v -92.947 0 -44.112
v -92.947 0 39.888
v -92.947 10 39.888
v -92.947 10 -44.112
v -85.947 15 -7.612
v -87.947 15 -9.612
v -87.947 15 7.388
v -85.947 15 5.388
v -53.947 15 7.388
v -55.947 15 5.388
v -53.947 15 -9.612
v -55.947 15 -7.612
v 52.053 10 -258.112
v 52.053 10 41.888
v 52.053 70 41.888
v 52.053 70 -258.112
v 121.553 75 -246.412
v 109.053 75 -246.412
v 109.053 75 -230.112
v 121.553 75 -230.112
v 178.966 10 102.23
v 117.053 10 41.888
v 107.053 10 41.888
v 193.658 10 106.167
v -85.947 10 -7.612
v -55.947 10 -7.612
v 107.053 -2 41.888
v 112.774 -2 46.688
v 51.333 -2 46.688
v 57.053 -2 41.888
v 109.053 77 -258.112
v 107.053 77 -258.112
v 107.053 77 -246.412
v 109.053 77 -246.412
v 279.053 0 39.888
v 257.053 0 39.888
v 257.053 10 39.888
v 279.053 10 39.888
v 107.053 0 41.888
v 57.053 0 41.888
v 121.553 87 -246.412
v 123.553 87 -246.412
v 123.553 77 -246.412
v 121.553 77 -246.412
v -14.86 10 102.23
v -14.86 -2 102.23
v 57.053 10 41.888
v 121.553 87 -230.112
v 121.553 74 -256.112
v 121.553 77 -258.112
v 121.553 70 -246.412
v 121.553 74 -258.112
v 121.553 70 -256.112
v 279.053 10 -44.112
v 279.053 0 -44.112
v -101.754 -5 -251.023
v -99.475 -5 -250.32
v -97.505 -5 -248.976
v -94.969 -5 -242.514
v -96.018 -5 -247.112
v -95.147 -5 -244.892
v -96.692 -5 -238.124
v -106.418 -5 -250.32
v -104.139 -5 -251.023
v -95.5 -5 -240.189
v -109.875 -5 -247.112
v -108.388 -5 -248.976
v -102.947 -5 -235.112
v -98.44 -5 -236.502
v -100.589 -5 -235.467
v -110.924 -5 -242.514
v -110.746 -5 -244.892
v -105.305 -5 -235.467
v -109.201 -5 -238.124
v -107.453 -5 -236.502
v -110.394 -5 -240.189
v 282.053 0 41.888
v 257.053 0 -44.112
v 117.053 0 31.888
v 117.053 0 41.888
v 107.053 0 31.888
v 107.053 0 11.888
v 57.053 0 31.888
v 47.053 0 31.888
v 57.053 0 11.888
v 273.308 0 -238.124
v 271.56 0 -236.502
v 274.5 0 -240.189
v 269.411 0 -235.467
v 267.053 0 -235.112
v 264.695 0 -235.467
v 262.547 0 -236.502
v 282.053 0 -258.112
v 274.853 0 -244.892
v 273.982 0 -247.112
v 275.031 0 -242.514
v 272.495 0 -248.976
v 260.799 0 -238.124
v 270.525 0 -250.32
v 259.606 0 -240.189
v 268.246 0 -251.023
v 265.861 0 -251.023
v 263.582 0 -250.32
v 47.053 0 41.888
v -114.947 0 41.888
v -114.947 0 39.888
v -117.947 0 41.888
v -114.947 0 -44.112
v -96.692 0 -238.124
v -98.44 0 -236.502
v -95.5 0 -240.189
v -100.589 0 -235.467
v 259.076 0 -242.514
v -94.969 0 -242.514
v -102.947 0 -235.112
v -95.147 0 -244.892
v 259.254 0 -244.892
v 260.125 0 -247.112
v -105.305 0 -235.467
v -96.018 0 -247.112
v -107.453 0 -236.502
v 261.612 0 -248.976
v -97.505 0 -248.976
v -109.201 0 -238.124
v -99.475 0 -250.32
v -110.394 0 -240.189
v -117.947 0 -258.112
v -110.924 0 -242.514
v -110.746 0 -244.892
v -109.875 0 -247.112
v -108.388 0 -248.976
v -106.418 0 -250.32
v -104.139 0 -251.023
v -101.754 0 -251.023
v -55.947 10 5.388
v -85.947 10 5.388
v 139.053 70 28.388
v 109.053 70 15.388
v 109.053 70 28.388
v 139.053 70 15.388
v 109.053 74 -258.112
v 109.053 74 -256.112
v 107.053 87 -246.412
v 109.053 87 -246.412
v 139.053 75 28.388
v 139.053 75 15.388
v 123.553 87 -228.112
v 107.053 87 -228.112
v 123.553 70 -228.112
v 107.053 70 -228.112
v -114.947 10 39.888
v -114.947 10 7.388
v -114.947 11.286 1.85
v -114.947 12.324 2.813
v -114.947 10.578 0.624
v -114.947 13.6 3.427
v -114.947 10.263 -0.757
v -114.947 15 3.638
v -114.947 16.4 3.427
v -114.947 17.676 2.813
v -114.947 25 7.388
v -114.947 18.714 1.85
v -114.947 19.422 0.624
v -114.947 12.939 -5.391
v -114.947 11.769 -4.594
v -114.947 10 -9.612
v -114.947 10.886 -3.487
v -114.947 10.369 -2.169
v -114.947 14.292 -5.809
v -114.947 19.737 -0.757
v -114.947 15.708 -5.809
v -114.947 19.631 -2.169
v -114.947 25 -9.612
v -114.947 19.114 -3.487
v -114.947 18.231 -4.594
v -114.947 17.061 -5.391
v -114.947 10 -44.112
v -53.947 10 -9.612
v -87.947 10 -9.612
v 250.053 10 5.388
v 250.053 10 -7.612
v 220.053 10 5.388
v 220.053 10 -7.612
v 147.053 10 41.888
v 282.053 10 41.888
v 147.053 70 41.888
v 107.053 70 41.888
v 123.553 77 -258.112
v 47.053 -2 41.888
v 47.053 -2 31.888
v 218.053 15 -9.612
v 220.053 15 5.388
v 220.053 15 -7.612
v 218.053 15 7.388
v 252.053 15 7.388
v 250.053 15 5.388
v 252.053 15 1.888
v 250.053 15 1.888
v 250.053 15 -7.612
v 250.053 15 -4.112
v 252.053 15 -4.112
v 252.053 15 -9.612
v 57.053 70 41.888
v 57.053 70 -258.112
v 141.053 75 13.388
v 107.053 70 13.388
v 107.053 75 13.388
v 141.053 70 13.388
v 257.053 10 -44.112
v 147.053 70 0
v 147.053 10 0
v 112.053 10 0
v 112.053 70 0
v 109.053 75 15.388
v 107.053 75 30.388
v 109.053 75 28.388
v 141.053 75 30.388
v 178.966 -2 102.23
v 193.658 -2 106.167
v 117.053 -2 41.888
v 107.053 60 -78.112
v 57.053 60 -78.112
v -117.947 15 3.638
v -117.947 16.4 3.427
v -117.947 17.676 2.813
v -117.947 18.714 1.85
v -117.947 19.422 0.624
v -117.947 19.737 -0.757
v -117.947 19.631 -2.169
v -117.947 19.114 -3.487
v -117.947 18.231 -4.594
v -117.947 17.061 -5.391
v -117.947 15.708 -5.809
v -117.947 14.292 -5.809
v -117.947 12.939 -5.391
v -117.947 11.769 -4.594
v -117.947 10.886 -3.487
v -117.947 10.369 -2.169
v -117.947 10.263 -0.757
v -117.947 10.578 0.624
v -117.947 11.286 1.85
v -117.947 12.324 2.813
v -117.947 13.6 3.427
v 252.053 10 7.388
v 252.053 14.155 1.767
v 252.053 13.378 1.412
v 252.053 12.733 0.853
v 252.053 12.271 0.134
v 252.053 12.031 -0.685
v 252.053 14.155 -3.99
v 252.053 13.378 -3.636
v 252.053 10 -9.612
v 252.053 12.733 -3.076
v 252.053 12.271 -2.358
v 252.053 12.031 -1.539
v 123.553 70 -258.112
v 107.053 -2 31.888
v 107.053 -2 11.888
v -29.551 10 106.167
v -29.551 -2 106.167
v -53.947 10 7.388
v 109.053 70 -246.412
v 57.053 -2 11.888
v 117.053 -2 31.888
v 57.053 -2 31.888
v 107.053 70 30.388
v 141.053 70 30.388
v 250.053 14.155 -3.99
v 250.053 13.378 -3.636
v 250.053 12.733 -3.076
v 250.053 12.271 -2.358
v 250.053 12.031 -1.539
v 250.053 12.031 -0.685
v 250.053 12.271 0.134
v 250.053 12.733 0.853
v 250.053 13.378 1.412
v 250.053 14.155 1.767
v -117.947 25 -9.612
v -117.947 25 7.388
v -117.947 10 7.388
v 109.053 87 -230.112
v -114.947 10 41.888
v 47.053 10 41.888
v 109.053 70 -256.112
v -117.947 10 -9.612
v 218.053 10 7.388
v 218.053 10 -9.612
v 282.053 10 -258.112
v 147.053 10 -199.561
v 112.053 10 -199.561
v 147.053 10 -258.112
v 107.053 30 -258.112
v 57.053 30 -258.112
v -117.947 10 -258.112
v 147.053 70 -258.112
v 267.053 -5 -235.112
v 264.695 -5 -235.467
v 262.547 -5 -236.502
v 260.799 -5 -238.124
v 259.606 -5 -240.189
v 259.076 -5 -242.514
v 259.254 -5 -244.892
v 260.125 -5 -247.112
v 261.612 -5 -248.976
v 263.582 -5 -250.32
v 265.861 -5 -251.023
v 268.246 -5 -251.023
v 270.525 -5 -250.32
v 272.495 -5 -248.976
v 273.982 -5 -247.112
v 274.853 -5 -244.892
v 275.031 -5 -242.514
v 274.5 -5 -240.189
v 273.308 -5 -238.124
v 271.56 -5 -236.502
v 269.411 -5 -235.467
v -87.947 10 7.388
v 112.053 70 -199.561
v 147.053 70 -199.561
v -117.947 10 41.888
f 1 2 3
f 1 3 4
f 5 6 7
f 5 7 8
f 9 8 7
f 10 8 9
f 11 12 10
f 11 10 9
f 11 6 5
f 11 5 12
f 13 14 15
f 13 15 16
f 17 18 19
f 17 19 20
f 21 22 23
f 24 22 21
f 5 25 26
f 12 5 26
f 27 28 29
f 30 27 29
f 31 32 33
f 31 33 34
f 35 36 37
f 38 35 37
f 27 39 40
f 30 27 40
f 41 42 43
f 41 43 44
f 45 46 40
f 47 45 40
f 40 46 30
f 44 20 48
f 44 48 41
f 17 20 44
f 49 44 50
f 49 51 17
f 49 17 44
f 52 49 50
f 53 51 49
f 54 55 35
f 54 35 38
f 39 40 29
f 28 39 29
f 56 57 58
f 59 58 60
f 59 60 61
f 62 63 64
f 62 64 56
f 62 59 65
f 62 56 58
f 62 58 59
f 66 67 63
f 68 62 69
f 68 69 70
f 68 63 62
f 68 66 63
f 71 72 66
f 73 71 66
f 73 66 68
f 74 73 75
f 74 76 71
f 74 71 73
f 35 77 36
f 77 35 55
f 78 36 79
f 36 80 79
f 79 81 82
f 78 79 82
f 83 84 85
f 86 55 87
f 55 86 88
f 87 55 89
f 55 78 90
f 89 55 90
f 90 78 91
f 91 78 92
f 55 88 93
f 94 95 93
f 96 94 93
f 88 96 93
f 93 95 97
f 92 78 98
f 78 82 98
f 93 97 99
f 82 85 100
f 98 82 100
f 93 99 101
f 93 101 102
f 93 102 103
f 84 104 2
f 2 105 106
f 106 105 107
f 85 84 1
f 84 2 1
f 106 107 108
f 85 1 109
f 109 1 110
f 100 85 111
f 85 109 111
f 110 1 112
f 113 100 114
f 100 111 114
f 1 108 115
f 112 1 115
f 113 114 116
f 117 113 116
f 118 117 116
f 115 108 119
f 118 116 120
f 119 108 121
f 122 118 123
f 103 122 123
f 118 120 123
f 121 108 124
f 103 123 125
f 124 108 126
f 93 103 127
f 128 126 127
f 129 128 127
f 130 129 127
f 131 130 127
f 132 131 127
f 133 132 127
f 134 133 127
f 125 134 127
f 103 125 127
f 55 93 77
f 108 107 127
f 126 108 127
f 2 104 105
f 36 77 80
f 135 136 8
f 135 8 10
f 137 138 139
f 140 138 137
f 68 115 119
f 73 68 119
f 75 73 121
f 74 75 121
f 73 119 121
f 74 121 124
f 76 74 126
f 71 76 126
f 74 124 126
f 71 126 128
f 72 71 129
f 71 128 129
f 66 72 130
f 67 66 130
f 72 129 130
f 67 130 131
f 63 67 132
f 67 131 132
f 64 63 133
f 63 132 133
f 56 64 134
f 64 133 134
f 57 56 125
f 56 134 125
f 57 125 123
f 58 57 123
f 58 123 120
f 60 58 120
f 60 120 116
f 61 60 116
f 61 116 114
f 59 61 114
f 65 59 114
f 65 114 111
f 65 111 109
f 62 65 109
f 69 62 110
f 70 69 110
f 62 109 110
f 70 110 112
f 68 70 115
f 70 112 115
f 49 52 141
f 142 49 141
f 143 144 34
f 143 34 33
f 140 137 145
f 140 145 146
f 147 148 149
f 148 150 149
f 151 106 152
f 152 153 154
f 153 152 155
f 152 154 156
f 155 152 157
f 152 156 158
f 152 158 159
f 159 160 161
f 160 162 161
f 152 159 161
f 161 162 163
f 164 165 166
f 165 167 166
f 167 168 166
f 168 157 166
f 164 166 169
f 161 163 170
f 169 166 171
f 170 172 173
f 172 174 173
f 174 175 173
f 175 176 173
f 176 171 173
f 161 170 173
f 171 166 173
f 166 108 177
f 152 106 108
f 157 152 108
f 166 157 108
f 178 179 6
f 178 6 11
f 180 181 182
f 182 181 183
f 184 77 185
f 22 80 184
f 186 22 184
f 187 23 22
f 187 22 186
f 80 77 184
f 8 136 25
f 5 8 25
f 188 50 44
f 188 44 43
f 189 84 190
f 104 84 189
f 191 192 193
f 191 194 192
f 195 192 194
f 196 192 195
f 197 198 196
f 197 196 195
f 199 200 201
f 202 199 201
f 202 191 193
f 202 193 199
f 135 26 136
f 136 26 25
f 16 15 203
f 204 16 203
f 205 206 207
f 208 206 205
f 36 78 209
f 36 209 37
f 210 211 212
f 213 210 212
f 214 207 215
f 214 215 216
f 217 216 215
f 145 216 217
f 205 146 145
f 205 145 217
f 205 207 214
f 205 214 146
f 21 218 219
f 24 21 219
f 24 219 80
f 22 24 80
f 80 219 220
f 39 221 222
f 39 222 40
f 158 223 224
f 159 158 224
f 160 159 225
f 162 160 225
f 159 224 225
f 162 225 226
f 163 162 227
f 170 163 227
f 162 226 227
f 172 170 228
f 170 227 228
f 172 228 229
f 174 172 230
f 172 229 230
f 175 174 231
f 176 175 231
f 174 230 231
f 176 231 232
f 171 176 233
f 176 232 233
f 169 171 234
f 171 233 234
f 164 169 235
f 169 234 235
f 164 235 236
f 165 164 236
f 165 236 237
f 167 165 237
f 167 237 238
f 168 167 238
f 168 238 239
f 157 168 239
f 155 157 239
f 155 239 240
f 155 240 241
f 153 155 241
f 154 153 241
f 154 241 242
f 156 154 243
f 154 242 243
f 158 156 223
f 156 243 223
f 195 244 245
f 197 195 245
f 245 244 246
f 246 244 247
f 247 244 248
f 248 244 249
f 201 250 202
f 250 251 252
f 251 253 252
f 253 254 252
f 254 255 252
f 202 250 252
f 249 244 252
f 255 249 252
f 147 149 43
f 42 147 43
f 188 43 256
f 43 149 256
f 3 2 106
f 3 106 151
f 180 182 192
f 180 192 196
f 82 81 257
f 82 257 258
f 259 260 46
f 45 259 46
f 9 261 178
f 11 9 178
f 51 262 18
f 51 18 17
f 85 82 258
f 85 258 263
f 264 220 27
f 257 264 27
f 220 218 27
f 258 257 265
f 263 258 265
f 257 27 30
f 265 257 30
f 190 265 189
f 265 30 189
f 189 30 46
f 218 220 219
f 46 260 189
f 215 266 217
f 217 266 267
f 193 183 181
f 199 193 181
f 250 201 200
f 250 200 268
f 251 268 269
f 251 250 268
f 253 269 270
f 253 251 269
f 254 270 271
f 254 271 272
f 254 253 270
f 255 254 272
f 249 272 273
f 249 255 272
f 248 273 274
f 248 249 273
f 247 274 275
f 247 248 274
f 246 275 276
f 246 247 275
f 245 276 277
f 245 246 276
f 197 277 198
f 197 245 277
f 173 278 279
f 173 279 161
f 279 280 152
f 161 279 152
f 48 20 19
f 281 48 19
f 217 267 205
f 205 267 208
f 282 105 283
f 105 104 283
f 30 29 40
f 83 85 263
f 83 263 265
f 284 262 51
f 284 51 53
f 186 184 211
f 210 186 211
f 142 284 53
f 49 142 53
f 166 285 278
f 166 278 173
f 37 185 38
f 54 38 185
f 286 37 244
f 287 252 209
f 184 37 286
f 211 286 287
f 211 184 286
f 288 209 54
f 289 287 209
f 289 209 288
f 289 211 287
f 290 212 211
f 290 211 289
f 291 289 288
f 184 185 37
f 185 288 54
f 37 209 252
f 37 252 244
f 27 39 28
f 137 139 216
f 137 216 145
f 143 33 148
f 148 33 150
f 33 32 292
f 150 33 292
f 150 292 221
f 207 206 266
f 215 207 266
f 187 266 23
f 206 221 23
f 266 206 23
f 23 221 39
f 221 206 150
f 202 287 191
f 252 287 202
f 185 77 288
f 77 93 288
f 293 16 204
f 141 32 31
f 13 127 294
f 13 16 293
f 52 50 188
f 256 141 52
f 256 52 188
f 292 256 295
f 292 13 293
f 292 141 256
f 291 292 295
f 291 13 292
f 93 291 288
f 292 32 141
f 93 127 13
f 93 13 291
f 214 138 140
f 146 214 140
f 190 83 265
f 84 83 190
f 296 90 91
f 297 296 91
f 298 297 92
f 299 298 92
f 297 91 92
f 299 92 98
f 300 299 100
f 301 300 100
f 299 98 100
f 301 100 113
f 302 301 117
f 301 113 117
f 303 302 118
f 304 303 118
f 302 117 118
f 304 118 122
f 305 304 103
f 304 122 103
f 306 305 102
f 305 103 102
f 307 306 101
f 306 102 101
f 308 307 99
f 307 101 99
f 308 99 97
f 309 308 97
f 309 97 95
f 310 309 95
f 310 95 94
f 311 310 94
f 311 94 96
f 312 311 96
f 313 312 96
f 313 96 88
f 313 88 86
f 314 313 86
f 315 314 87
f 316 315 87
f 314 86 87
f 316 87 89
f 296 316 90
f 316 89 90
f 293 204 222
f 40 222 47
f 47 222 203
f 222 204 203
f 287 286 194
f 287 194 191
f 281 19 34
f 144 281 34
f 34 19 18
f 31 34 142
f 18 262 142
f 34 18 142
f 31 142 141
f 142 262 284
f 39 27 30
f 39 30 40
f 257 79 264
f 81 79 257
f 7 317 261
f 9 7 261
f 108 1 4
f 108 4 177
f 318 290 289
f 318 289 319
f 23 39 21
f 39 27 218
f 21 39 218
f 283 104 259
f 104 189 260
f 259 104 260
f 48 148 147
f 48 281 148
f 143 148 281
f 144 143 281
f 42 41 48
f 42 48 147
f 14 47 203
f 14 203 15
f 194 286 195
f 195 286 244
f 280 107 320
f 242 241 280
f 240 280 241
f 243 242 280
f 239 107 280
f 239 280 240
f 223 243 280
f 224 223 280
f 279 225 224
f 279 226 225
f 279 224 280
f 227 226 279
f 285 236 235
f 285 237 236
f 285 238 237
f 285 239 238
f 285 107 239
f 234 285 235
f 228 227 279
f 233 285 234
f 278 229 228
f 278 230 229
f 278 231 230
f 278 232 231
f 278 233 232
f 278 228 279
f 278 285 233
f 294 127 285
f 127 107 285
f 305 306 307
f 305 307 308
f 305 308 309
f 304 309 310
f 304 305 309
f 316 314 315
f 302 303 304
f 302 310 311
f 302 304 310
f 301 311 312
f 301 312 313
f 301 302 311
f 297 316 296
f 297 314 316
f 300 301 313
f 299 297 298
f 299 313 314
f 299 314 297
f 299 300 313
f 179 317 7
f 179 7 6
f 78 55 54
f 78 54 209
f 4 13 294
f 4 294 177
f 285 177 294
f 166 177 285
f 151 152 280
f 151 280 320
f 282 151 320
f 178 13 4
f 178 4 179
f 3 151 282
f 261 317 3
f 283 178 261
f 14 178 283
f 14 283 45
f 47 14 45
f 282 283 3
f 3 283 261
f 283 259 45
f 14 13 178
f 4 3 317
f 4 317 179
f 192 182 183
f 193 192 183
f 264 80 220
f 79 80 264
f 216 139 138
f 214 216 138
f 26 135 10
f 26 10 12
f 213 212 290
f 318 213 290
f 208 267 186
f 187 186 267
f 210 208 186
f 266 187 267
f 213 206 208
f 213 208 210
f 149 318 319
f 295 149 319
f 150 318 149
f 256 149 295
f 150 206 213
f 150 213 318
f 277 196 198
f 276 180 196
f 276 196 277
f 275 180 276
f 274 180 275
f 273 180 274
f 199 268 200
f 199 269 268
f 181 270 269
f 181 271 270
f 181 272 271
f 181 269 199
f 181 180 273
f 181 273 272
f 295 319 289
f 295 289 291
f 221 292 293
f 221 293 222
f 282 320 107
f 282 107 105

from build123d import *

# Parameters (mm, degrees)
BOSS_EXTRUDE3_DEPTH              = 10
SKETCH2_W                        = 34
SKETCH2_H                        = 17
SKETCH2_W_2                      = 30
SKETCH2_H_2                      = 13
BOSS_EXTRUDE4_DEPTH              = 5
SKETCH3_W                        = 50
SKETCH3_H                        = 120
BOSS_EXTRUDE5_DEPTH              = 50
CUT_EXTRUDE2_DEPTH               = 50
SKETCH5_W                        = 50
SKETCH5_H                        = 180
BOSS_EXTRUDE6_DEPTH              = 50
CUT_EXTRUDE3_DEPTH               = 348.630164486
SKETCH7_W                        = 5
SKETCH7_H                        = 300
BOSS_EXTRUDE7_DEPTH              = 70
SKETCH9_W                        = 34
SKETCH9_H                        = 17
SKETCH9_W_2                      = 30
SKETCH9_H_2                      = 13
BOSS_EXTRUDE8_DEPTH              = 5
SKETCH10_W                       = 58.550377391
SKETCH10_H                       = 60
BOSS_EXTRUDE9_DEPTH              = 35
SKETCH13_W                       = 16.5
SKETCH13_H                       = 30
SKETCH13_W_2                     = 12.5
SKETCH13_H_2                     = 26
BOSS_EXTRUDE11_DEPTH             = 7
BOSS_EXTRUDE16_DEPTH             = 10
BOSS_EXTRUDE16_DEPTH_BACK        = 2
BOSS_EXTRUDE19_DEPTH             = 2
BOSS_EXTRUDE23_REACH             = 352.964
BOSS_EXTRUDE23_DIRECTION_2_REACH = 352.964
SKETCH28_W                       = 3
SKETCH28_H                       = 10
BOSS_EXTRUDE24_DEPTH             = 85.999998
SKETCH30_W                       = 3
SKETCH30_H                       = 10
BOSS_EXTRUDE26_DEPTH             = 86
SKETCH32_W                       = 12.5
SKETCH32_H                       = 16.3
BOSS_EXTRUDE28_DEPTH             = 5
BOSS_EXTRUDE31_DEPTH             = 10
SKETCH35_W                       = 12.5
SKETCH35_H                       = 3
CUT_EXTRUDE4_DEPTH               = 2
CUT_EXTRUDE14_DEPTH              = 2
SKETCH41_W                       = 3
SKETCH41_H                       = 17
BOSS_EXTRUDE33_DEPTH             = 15
SKETCH42_R                       = 4.75
CUT_EXTRUDE11_DEPTH              = 3
SKETCH14_R                       = 8
BOSS_EXTRUDE34_DEPTH             = 5
SKETCH16_R                       = 8
BOSS_EXTRUDE35_DEPTH             = 5
SKETCH43_W                       = 2
SKETCH43_H                       = 10
BOSS_EXTRUDE36_DEPTH             = 22
BOSS_EXTRUDE37_REACH             = 465.482
SKETCH44_W                       = 2
SKETCH44_H                       = 10


with BuildPart() as part:
    # Sketch1 → Boss-Extrude3 (new body)
    with BuildSketch(Plane(origin=(0, 0, 0), x_dir=(1, 0, 0), z_dir=(0, 1, 0))):
        Polygon((-117.946551632, 258.11185804), (282.053448368, 258.11185804), (282.053448368, 44.11185804), (257.053448368, 44.11185804), (257.053448368, -41.88814196), (-92.946551632, -41.88814196), (-92.946551632, 44.11185804), (-117.946551632, 44.11185804), align=None)
    extrude(amount=BOSS_EXTRUDE3_DEPTH)

    # Sketch2 → Boss-Extrude4 (add)
    # profile 1 of 2: a face of its own
    with BuildSketch(Plane(origin=(0, 10, 0), x_dir=(1, 0, 0), z_dir=(0, 1, 0))):
        with Locations((-70.946551632, 1.11185804)):
            Rectangle(SKETCH2_W, SKETCH2_H)
        with Locations((-70.946551632, 1.11185804)):
            Rectangle(SKETCH2_W_2, SKETCH2_H_2, mode=Mode.SUBTRACT)
    # profile 2 of 2: a face of its own
    with BuildSketch(Plane(origin=(0, 10, 0), x_dir=(1, 0, 0), z_dir=(0, 1, 0))):
        with Locations((235.053448368, 1.11185804)):
            Rectangle(SKETCH2_W, SKETCH2_H)
        with Locations((235.053448368, 1.11185804)):
            Rectangle(SKETCH2_W_2, SKETCH2_H_2, mode=Mode.SUBTRACT)
    extrude(amount=BOSS_EXTRUDE4_DEPTH)

    # Sketch3 → Boss-Extrude5 (add)
    with BuildSketch(Plane(origin=(0, 10, 0), x_dir=(1, 0, 0), z_dir=(0, 1, 0))):
        with Locations((82.053448368, 18.11185804)):
            Rectangle(SKETCH3_W, SKETCH3_H)
    extrude(amount=BOSS_EXTRUDE5_DEPTH)

    # Sketch4 → Cut-Extrude2 (cut)
    with BuildSketch(Plane(origin=(107.053448368, 0, 0), x_dir=(0, 0, -1), z_dir=(1, 0, 0))):
        Polygon((-41.88814196, 60), (78.11185804, 60), (-41.88814196, 0), align=None)
    extrude(amount=-CUT_EXTRUDE2_DEPTH, mode=Mode.SUBTRACT)

    # Sketch5 → Boss-Extrude6 (add)
    with BuildSketch(Plane(origin=(0, 10, 0), x_dir=(1, 0, 0), z_dir=(0, 1, 0))):
        with Locations((82.053448368, 168.11185804)):
            Rectangle(SKETCH5_W, SKETCH5_H)
    extrude(amount=BOSS_EXTRUDE6_DEPTH)

    # Sketch6 → Cut-Extrude3 (cut, through all)
    with BuildSketch(Plane(origin=(107.053448368, 0, 0), x_dir=(0, 0, -1), z_dir=(1, 0, 0))):
        Polygon((78.11185804, 60), (258.11185804, 60), (258.11185804, 30), align=None)
    extrude(amount=-CUT_EXTRUDE3_DEPTH, mode=Mode.SUBTRACT)

    # Sketch7 → Boss-Extrude7 (add)
    with BuildSketch(Plane(origin=(0, 0, 0), x_dir=(1, 0, 0), z_dir=(0, 1, 0))):
        with Locations((54.553448368, 108.11185804)):
            Rectangle(SKETCH7_W, SKETCH7_H)
        Polygon((112.053448368, 258.11185804), (107.053448368, 258.11185804), (107.053448368, -41.88814196), (147.053448368, -41.88814196), (147.053448368, 0), (112.053448368, 0), align=None)
    extrude(amount=BOSS_EXTRUDE7_DEPTH)

    # Sketch9 → Boss-Extrude8 (add)
    with BuildSketch(Plane(origin=(0, 70, 0), x_dir=(1, 0, 0), z_dir=(0, 1, 0))):
        with Locations((124.053448368, -21.88814196)):
            Rectangle(SKETCH9_W, SKETCH9_H)
        with Locations((124.053448368, -21.88814196)):
            Rectangle(SKETCH9_W_2, SKETCH9_H_2, mode=Mode.SUBTRACT)
    extrude(amount=BOSS_EXTRUDE8_DEPTH)

    # Sketch10 → Boss-Extrude9 (add)
    with BuildSketch(Plane(origin=(112.053448368, 0, 0), x_dir=(0, 0, -1), z_dir=(1, 0, 0))):
        with Locations((228.836669345, 40)):
            Rectangle(SKETCH10_W, SKETCH10_H)
    extrude(amount=BOSS_EXTRUDE9_DEPTH)

    # Sketch13 → Boss-Extrude11 (add)
    with BuildSketch(Plane(origin=(0, 70, 0), x_dir=(1, 0, 0), z_dir=(0, 1, 0))):
        with Locations((115.303448368, 243.11185804)):
            Rectangle(SKETCH13_W, SKETCH13_H)
        with Locations((115.303448368, 243.11185804)):
            Rectangle(SKETCH13_W_2, SKETCH13_H_2, mode=Mode.SUBTRACT)
    extrude(amount=BOSS_EXTRUDE11_DEPTH)

    # Sketch20 → Boss-Extrude16 (add, two sides: drawn at the far end of the back side and taken through both)
    with BuildSketch(Plane(origin=(0, 0, 0), x_dir=(1, 0, 0), z_dir=(0, 1, 0)).offset(-BOSS_EXTRUDE16_DEPTH_BACK)):
        Polygon((47.053448368, -41.88814196), (-29.550995944, -106.166902929), (-14.859601624, -102.230355685), (57.053448368, -41.88814196), align=None)
        Polygon((107.053448368, -41.88814196), (178.96649836, -102.230355685), (193.65789268, -106.166902929), (117.053448368, -41.88814196), align=None)
    extrude(amount=BOSS_EXTRUDE16_DEPTH + BOSS_EXTRUDE16_DEPTH_BACK)

    # Sketch21 → Boss-Extrude19 (add)
    with BuildSketch(Plane.XZ):
        Polygon((57.053448368, 41.88814196), (107.053448368, 41.88814196), (117.053448368, 41.88814196), (117.053448368, 31.88814196), (107.053448368, 31.88814196), (107.053448368, 11.88814196), (57.053448368, 11.88814196), (57.053448368, 31.88814196), (47.053448368, 31.88814196), (47.053448368, 41.88814196), align=None)
    extrude(amount=BOSS_EXTRUDE19_DEPTH)


with BuildPart() as body_2:

    # Boss-Extrude23: up to this face of the body (flat: up to its plane)
    boss_extrude23_end = Plane(part.part.faces().sort_by_distance((21.096923372, 4, 72.059248823))[0])
    # Sketch23 → Boss-Extrude23 (new, up to the picked face)
    with BuildSketch(Plane(origin=(107.053448368, 0, 0), x_dir=(0, 0, -1), z_dir=(1, 0, 0)), mode=Mode.PRIVATE) as boss_extrude23_sk1:
        Polygon((-41.88814196, 0), (-46.68814196, -2), (-41.88814196, -2), align=None)
    boss_extrude23_tool1 = split(extrude(boss_extrude23_sk1.sketch, amount=-BOSS_EXTRUDE23_REACH, mode=Mode.PRIVATE), bisect_by=boss_extrude23_end, keep=Keep.BOTH, mode=Mode.PRIVATE)
    add(boss_extrude23_tool1.solids().sort_by(Axis((107.053448, -1.333333, 43.488142), (-1, 0, 0)))[0])


    # Boss-Extrude23 direction 2: up to this face of the body (flat: up to its plane)
    boss_extrude23_direction_2_end = Plane(part.part.faces().sort_by_distance((143.009973364, 4, 72.059248823))[0])
    # Sketch23 → Boss-Extrude23 direction 2 (add, up to the picked face)
    with BuildSketch(Plane(origin=(107.053448368, 0, 0), x_dir=(0, 0, -1), z_dir=(1, 0, 0)), mode=Mode.PRIVATE) as boss_extrude23_direction_2_sk1:
        Polygon((-41.88814196, 0), (-46.68814196, -2), (-41.88814196, -2), align=None)
    boss_extrude23_direction_2_tool1 = split(extrude(boss_extrude23_direction_2_sk1.sketch, amount=BOSS_EXTRUDE23_DIRECTION_2_REACH, mode=Mode.PRIVATE), bisect_by=boss_extrude23_direction_2_end, keep=Keep.BOTH, mode=Mode.PRIVATE)
    add(boss_extrude23_direction_2_tool1.solids().sort_by(Axis((107.053448, -1.333333, 43.488142), (1, 0, 0)))[0])


with BuildPart() as part_1:
    add(part.part)

    # Sketch28 → Boss-Extrude24 (add)
    with BuildSketch(Plane.XY.offset(-44.11185804)):
        with Locations((-116.446551632, 5)):
            Rectangle(SKETCH28_W, SKETCH28_H)
    extrude(amount=BOSS_EXTRUDE24_DEPTH)

    # Sketch30 → Boss-Extrude26 (add)
    with BuildSketch(Plane.XY.offset(-44.11185804)):
        with Locations((280.553448368, 5)):
            Rectangle(SKETCH30_W, SKETCH30_H)
    extrude(amount=BOSS_EXTRUDE26_DEPTH)

    # Sketch32 → Boss-Extrude28 (add)
    with BuildSketch(Plane(origin=(0, 70, 0), x_dir=(1, 0, 0), z_dir=(0, 1, 0))):
        with Locations((115.303448368, 238.26185804)):
            Rectangle(SKETCH32_W, SKETCH32_H)
    extrude(amount=BOSS_EXTRUDE28_DEPTH)

    # Sketch34 → Boss-Extrude31 (add)
    with BuildSketch(Plane(origin=(0, 77, 0), x_dir=(1, 0, 0), z_dir=(0, 1, 0))):
        Polygon((109.053448368, 246.41185804), (107.053448368, 246.41185804), (107.053448368, 228.11185804), (123.553448368, 228.11185804), (123.553448368, 246.41185804), (121.553448368, 246.41185804), (121.553448368, 230.11185804), (109.053448368, 230.11185804), align=None)
    extrude(amount=BOSS_EXTRUDE31_DEPTH)

    # Sketch35 → Cut-Extrude4 (cut)
    with BuildSketch(Plane(origin=(0, 0, -258.11185804), x_dir=(-1, 0, 0), z_dir=(0, 0, -1))):
        with Locations((-115.303448368, 75.5)):
            Rectangle(SKETCH35_W, SKETCH35_H)
    extrude(amount=-CUT_EXTRUDE4_DEPTH, mode=Mode.SUBTRACT)

    # Sketch47 → Cut-Extrude14 (cut)
    with BuildSketch(Plane(origin=(252.053448368, 0, 0), x_dir=(0, 0, -1), z_dir=(1, 0, 0))):
        with BuildLine():
            Line((-1.88814196, 15), (4.11185804, 15))
            ThreePointArc((4.11185804, 15), (1.11185804, 12), (-1.88814196, 15))
        make_face()
    extrude(amount=-CUT_EXTRUDE14_DEPTH, mode=Mode.SUBTRACT)

    # Sketch41 → Boss-Extrude33 (add)
    with BuildSketch(Plane(origin=(0, 10, 0), x_dir=(1, 0, 0), z_dir=(0, 1, 0))):
        with Locations((-116.446551632, 1.11185804)):
            Rectangle(SKETCH41_W, SKETCH41_H)
    extrude(amount=BOSS_EXTRUDE33_DEPTH)

    # Sketch42 → Cut-Extrude11 (cut)
    with BuildSketch(Plane.ZY.offset(117.946551632)):
        with Locations((-1.11185804, 15)):
            Circle(SKETCH42_R)
    extrude(amount=-CUT_EXTRUDE11_DEPTH, mode=Mode.SUBTRACT)

    # Sketch14 → Boss-Extrude34 (add)
    with BuildSketch(Plane.XZ):
        with Locations(Location((267.053448368, -243.11185804, 0), (0, 0, 90))):
            Circle(SKETCH14_R)
    extrude(amount=BOSS_EXTRUDE34_DEPTH)

    # Sketch16 → Boss-Extrude35 (add)
    with BuildSketch(Plane.XZ):
        with Locations(Location((-102.946551632, -243.11185804, 0), (0, 0, 90))):
            Circle(SKETCH16_R)
    extrude(amount=BOSS_EXTRUDE35_DEPTH)

    # Sketch43 → Boss-Extrude36 (add)
    with BuildSketch(Plane.ZY.offset(92.946551632)):
        with Locations((40.88814196, 5)):
            Rectangle(SKETCH43_W, SKETCH43_H)
    extrude(amount=BOSS_EXTRUDE36_DEPTH)

    # Sketch44 → Boss-Extrude37 (add, up to next)
    with BuildSketch(Plane(origin=(257.053448368, 0, 0), x_dir=(0, 0, -1), z_dir=(1, 0, 0)), mode=Mode.PRIVATE) as boss_extrude37_sk1:
        with Locations((-40.88814196, 5)):
            Rectangle(SKETCH44_W, SKETCH44_H)
    boss_extrude37_tool1 = extrude(boss_extrude37_sk1.sketch, amount=BOSS_EXTRUDE37_REACH, mode=Mode.PRIVATE) - part_1.part
    add(boss_extrude37_tool1.solids().sort_by_distance((257.053448, 5, 40.888142))[0])


solid = Compound([body_2.part, part_1.part])
